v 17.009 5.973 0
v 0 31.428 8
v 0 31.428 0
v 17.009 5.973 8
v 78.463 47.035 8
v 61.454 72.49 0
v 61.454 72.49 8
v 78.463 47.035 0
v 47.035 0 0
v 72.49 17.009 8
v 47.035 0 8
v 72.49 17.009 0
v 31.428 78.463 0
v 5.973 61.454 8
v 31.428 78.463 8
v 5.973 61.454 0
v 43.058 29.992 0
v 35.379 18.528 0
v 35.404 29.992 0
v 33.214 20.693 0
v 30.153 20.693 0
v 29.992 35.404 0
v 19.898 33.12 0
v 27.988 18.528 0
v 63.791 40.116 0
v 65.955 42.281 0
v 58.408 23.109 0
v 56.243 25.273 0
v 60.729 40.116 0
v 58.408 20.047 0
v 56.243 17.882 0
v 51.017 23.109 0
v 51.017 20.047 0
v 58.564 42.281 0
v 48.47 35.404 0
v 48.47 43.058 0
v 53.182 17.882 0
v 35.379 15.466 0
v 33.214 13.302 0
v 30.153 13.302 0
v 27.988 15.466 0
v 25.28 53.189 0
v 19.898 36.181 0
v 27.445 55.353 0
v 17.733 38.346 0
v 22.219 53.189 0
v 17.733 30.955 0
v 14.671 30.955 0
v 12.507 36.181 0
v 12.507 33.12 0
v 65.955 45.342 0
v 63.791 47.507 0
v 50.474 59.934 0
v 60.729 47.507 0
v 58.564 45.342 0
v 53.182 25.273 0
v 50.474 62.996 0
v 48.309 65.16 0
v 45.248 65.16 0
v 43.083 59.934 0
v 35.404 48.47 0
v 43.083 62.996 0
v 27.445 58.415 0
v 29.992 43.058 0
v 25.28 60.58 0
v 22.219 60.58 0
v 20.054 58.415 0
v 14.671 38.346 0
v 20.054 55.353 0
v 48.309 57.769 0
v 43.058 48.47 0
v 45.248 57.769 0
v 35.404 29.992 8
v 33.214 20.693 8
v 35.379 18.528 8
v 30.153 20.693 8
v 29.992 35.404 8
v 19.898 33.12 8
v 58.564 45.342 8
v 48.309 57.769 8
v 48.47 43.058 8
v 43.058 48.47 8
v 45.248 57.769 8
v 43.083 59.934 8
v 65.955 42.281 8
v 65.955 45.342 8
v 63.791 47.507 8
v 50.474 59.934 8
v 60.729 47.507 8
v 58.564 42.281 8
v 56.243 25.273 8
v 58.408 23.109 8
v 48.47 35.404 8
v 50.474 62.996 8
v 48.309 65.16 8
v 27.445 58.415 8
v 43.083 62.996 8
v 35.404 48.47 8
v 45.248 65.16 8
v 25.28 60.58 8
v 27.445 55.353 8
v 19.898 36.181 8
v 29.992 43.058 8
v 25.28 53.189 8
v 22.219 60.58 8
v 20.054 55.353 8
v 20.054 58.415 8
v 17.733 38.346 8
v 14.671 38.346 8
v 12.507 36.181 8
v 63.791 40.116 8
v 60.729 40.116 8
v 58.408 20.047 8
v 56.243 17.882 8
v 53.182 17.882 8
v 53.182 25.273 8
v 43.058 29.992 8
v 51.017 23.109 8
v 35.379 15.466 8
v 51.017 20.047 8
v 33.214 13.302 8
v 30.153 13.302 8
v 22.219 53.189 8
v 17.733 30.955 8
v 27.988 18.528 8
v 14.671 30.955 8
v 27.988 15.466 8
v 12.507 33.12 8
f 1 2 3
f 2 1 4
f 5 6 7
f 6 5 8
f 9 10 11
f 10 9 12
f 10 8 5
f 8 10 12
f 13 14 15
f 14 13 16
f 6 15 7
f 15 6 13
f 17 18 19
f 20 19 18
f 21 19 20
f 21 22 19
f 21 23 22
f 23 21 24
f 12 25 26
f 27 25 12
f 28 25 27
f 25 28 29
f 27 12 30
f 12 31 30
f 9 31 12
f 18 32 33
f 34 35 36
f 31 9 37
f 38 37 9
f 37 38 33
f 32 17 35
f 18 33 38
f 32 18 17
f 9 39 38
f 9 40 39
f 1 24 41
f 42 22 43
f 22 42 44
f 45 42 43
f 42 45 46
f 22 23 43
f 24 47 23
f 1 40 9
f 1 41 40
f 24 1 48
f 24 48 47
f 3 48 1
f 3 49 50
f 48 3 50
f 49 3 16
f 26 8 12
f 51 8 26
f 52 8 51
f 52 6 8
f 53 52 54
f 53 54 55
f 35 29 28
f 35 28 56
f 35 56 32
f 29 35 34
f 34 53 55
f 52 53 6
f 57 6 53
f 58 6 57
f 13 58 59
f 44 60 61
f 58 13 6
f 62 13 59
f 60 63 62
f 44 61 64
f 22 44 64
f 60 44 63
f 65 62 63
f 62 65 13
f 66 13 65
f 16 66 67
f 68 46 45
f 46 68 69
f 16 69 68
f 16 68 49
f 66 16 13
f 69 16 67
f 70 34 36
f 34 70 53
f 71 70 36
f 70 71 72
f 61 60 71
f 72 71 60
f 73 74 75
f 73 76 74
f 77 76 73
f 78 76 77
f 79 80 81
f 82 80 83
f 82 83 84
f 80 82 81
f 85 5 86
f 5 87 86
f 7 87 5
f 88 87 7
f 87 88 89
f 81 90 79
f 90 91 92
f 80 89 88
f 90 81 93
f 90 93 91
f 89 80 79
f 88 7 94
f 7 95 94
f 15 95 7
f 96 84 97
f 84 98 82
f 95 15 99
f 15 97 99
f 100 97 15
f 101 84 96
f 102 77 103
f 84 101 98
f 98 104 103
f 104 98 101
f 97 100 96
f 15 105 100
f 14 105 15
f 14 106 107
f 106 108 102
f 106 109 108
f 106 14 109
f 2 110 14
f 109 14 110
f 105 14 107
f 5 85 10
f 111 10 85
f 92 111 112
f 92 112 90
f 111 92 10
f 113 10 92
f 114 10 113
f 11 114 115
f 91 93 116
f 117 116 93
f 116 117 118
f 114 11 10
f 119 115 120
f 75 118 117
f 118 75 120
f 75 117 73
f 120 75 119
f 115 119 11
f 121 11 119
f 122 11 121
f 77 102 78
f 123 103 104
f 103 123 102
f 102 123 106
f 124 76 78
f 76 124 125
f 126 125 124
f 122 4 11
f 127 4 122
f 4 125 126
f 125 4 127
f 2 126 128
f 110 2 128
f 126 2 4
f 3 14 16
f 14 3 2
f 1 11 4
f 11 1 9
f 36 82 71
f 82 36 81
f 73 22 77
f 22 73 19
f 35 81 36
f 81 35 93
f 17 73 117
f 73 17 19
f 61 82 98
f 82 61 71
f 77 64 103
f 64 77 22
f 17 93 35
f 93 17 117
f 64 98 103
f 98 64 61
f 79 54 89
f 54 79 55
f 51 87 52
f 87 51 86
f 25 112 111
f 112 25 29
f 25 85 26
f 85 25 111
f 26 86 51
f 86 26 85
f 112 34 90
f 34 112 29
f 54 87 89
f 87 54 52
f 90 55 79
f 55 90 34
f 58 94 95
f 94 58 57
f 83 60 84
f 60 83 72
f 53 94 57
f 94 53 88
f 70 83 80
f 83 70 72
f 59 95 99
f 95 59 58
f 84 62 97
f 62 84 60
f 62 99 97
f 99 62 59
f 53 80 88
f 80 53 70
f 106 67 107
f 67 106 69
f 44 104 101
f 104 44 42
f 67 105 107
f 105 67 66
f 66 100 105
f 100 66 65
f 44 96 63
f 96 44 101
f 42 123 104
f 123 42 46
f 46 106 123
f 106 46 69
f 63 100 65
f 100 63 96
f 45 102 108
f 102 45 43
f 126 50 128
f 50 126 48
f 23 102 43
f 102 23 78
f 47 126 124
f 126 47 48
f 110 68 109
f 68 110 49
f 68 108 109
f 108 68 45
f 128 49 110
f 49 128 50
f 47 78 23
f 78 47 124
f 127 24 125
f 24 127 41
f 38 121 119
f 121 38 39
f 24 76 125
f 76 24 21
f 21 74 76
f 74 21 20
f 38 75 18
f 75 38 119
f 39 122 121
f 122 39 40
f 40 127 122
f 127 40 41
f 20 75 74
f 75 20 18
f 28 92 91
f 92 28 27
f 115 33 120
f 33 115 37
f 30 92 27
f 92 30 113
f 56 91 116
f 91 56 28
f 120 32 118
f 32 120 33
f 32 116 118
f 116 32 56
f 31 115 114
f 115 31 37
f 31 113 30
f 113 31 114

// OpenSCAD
$fn = 32;

// ----------------------------------------------------------------------
// Polygon plate: 8-gon R40, 6 bolt windows
// ----------------------------------------------------------------------

// --- parameters (mm) ---
sides = 8;                // number of polygon sides
plate_r = 40;             // circumscribed radius of the polygon
bore_r = 10;              // centre bore radius
bolts = 6;                // number of bolt windows
ring_r = 23.48;           // bolt-circle radius
bolt_r = 4;               // bolt window radius
plate_t = 8;              // plate thickness, Z (extrusion height)

plate_d = 2 * plate_r;  // circumscribed diameter
bore_d = 2 * bore_r;  // centre bore diameter
bolt_d = 2 * bolt_r;  // bolt window diameter
ring_d = 2 * ring_r;  // bolt-circle diameter

profile = [[78.463, 47.035], [61.454, 72.49], [31.428, 78.463], [5.973, 61.454], [0, 31.428], [17.009, 5.973], [47.035, 0], [72.49, 17.009]];  // primary outline, 8 points, counter clockwise
void_1 = [[48.47, 43.058], [43.058, 48.47], [35.404, 48.47], [29.992, 43.058], [29.992, 35.404], [35.404, 29.992], [43.058, 29.992], [48.47, 35.404]];  // centre bore, 8 points
void_2 = [[65.955, 45.342], [63.791, 47.507], [60.729, 47.507], [58.564, 45.342], [58.564, 42.281], [60.729, 40.116], [63.791, 40.116], [65.955, 42.281]];  // bolt window 1, 8 points
void_3 = [[50.474, 62.996], [48.309, 65.16], [45.248, 65.16], [43.083, 62.996], [43.083, 59.934], [45.248, 57.769], [48.309, 57.769], [50.474, 59.934]];  // bolt window 2, 8 points
void_4 = [[27.445, 58.415], [25.28, 60.58], [22.219, 60.58], [20.054, 58.415], [20.054, 55.353], [22.219, 53.189], [25.28, 53.189], [27.445, 55.353]];  // bolt window 3, 8 points
void_5 = [[19.898, 36.181], [17.733, 38.346], [14.671, 38.346], [12.507, 36.181], [12.507, 33.12], [14.671, 30.955], [17.733, 30.955], [19.898, 33.12]];  // bolt window 4, 8 points
void_6 = [[35.379, 18.528], [33.214, 20.693], [30.153, 20.693], [27.988, 18.528], [27.988, 15.466], [30.153, 13.302], [33.214, 13.302], [35.379, 15.466]];  // bolt window 5, 8 points
void_7 = [[58.408, 23.109], [56.243, 25.273], [53.182, 25.273], [51.017, 23.109], [51.017, 20.047], [53.182, 17.882], [56.243, 17.882], [58.408, 20.047]];  // bolt window 6, 8 points

// --- the one profile operation ---
difference() {
  linear_extrude(height = plate_t) polygon(points = profile);
  translate([0, 0, -1])
    linear_extrude(height = plate_t + 2) polygon(points = void_1);
  translate([0, 0, -1])
    linear_extrude(height = plate_t + 2) polygon(points = void_2);
  translate([0, 0, -1])
    linear_extrude(height = plate_t + 2) polygon(points = void_3);
  translate([0, 0, -1])
    linear_extrude(height = plate_t + 2) polygon(points = void_4);
  translate([0, 0, -1])
    linear_extrude(height = plate_t + 2) polygon(points = void_5);
  translate([0, 0, -1])
    linear_extrude(height = plate_t + 2) polygon(points = void_6);
  translate([0, 0, -1])
    linear_extrude(height = plate_t + 2) polygon(points = void_7);
}
